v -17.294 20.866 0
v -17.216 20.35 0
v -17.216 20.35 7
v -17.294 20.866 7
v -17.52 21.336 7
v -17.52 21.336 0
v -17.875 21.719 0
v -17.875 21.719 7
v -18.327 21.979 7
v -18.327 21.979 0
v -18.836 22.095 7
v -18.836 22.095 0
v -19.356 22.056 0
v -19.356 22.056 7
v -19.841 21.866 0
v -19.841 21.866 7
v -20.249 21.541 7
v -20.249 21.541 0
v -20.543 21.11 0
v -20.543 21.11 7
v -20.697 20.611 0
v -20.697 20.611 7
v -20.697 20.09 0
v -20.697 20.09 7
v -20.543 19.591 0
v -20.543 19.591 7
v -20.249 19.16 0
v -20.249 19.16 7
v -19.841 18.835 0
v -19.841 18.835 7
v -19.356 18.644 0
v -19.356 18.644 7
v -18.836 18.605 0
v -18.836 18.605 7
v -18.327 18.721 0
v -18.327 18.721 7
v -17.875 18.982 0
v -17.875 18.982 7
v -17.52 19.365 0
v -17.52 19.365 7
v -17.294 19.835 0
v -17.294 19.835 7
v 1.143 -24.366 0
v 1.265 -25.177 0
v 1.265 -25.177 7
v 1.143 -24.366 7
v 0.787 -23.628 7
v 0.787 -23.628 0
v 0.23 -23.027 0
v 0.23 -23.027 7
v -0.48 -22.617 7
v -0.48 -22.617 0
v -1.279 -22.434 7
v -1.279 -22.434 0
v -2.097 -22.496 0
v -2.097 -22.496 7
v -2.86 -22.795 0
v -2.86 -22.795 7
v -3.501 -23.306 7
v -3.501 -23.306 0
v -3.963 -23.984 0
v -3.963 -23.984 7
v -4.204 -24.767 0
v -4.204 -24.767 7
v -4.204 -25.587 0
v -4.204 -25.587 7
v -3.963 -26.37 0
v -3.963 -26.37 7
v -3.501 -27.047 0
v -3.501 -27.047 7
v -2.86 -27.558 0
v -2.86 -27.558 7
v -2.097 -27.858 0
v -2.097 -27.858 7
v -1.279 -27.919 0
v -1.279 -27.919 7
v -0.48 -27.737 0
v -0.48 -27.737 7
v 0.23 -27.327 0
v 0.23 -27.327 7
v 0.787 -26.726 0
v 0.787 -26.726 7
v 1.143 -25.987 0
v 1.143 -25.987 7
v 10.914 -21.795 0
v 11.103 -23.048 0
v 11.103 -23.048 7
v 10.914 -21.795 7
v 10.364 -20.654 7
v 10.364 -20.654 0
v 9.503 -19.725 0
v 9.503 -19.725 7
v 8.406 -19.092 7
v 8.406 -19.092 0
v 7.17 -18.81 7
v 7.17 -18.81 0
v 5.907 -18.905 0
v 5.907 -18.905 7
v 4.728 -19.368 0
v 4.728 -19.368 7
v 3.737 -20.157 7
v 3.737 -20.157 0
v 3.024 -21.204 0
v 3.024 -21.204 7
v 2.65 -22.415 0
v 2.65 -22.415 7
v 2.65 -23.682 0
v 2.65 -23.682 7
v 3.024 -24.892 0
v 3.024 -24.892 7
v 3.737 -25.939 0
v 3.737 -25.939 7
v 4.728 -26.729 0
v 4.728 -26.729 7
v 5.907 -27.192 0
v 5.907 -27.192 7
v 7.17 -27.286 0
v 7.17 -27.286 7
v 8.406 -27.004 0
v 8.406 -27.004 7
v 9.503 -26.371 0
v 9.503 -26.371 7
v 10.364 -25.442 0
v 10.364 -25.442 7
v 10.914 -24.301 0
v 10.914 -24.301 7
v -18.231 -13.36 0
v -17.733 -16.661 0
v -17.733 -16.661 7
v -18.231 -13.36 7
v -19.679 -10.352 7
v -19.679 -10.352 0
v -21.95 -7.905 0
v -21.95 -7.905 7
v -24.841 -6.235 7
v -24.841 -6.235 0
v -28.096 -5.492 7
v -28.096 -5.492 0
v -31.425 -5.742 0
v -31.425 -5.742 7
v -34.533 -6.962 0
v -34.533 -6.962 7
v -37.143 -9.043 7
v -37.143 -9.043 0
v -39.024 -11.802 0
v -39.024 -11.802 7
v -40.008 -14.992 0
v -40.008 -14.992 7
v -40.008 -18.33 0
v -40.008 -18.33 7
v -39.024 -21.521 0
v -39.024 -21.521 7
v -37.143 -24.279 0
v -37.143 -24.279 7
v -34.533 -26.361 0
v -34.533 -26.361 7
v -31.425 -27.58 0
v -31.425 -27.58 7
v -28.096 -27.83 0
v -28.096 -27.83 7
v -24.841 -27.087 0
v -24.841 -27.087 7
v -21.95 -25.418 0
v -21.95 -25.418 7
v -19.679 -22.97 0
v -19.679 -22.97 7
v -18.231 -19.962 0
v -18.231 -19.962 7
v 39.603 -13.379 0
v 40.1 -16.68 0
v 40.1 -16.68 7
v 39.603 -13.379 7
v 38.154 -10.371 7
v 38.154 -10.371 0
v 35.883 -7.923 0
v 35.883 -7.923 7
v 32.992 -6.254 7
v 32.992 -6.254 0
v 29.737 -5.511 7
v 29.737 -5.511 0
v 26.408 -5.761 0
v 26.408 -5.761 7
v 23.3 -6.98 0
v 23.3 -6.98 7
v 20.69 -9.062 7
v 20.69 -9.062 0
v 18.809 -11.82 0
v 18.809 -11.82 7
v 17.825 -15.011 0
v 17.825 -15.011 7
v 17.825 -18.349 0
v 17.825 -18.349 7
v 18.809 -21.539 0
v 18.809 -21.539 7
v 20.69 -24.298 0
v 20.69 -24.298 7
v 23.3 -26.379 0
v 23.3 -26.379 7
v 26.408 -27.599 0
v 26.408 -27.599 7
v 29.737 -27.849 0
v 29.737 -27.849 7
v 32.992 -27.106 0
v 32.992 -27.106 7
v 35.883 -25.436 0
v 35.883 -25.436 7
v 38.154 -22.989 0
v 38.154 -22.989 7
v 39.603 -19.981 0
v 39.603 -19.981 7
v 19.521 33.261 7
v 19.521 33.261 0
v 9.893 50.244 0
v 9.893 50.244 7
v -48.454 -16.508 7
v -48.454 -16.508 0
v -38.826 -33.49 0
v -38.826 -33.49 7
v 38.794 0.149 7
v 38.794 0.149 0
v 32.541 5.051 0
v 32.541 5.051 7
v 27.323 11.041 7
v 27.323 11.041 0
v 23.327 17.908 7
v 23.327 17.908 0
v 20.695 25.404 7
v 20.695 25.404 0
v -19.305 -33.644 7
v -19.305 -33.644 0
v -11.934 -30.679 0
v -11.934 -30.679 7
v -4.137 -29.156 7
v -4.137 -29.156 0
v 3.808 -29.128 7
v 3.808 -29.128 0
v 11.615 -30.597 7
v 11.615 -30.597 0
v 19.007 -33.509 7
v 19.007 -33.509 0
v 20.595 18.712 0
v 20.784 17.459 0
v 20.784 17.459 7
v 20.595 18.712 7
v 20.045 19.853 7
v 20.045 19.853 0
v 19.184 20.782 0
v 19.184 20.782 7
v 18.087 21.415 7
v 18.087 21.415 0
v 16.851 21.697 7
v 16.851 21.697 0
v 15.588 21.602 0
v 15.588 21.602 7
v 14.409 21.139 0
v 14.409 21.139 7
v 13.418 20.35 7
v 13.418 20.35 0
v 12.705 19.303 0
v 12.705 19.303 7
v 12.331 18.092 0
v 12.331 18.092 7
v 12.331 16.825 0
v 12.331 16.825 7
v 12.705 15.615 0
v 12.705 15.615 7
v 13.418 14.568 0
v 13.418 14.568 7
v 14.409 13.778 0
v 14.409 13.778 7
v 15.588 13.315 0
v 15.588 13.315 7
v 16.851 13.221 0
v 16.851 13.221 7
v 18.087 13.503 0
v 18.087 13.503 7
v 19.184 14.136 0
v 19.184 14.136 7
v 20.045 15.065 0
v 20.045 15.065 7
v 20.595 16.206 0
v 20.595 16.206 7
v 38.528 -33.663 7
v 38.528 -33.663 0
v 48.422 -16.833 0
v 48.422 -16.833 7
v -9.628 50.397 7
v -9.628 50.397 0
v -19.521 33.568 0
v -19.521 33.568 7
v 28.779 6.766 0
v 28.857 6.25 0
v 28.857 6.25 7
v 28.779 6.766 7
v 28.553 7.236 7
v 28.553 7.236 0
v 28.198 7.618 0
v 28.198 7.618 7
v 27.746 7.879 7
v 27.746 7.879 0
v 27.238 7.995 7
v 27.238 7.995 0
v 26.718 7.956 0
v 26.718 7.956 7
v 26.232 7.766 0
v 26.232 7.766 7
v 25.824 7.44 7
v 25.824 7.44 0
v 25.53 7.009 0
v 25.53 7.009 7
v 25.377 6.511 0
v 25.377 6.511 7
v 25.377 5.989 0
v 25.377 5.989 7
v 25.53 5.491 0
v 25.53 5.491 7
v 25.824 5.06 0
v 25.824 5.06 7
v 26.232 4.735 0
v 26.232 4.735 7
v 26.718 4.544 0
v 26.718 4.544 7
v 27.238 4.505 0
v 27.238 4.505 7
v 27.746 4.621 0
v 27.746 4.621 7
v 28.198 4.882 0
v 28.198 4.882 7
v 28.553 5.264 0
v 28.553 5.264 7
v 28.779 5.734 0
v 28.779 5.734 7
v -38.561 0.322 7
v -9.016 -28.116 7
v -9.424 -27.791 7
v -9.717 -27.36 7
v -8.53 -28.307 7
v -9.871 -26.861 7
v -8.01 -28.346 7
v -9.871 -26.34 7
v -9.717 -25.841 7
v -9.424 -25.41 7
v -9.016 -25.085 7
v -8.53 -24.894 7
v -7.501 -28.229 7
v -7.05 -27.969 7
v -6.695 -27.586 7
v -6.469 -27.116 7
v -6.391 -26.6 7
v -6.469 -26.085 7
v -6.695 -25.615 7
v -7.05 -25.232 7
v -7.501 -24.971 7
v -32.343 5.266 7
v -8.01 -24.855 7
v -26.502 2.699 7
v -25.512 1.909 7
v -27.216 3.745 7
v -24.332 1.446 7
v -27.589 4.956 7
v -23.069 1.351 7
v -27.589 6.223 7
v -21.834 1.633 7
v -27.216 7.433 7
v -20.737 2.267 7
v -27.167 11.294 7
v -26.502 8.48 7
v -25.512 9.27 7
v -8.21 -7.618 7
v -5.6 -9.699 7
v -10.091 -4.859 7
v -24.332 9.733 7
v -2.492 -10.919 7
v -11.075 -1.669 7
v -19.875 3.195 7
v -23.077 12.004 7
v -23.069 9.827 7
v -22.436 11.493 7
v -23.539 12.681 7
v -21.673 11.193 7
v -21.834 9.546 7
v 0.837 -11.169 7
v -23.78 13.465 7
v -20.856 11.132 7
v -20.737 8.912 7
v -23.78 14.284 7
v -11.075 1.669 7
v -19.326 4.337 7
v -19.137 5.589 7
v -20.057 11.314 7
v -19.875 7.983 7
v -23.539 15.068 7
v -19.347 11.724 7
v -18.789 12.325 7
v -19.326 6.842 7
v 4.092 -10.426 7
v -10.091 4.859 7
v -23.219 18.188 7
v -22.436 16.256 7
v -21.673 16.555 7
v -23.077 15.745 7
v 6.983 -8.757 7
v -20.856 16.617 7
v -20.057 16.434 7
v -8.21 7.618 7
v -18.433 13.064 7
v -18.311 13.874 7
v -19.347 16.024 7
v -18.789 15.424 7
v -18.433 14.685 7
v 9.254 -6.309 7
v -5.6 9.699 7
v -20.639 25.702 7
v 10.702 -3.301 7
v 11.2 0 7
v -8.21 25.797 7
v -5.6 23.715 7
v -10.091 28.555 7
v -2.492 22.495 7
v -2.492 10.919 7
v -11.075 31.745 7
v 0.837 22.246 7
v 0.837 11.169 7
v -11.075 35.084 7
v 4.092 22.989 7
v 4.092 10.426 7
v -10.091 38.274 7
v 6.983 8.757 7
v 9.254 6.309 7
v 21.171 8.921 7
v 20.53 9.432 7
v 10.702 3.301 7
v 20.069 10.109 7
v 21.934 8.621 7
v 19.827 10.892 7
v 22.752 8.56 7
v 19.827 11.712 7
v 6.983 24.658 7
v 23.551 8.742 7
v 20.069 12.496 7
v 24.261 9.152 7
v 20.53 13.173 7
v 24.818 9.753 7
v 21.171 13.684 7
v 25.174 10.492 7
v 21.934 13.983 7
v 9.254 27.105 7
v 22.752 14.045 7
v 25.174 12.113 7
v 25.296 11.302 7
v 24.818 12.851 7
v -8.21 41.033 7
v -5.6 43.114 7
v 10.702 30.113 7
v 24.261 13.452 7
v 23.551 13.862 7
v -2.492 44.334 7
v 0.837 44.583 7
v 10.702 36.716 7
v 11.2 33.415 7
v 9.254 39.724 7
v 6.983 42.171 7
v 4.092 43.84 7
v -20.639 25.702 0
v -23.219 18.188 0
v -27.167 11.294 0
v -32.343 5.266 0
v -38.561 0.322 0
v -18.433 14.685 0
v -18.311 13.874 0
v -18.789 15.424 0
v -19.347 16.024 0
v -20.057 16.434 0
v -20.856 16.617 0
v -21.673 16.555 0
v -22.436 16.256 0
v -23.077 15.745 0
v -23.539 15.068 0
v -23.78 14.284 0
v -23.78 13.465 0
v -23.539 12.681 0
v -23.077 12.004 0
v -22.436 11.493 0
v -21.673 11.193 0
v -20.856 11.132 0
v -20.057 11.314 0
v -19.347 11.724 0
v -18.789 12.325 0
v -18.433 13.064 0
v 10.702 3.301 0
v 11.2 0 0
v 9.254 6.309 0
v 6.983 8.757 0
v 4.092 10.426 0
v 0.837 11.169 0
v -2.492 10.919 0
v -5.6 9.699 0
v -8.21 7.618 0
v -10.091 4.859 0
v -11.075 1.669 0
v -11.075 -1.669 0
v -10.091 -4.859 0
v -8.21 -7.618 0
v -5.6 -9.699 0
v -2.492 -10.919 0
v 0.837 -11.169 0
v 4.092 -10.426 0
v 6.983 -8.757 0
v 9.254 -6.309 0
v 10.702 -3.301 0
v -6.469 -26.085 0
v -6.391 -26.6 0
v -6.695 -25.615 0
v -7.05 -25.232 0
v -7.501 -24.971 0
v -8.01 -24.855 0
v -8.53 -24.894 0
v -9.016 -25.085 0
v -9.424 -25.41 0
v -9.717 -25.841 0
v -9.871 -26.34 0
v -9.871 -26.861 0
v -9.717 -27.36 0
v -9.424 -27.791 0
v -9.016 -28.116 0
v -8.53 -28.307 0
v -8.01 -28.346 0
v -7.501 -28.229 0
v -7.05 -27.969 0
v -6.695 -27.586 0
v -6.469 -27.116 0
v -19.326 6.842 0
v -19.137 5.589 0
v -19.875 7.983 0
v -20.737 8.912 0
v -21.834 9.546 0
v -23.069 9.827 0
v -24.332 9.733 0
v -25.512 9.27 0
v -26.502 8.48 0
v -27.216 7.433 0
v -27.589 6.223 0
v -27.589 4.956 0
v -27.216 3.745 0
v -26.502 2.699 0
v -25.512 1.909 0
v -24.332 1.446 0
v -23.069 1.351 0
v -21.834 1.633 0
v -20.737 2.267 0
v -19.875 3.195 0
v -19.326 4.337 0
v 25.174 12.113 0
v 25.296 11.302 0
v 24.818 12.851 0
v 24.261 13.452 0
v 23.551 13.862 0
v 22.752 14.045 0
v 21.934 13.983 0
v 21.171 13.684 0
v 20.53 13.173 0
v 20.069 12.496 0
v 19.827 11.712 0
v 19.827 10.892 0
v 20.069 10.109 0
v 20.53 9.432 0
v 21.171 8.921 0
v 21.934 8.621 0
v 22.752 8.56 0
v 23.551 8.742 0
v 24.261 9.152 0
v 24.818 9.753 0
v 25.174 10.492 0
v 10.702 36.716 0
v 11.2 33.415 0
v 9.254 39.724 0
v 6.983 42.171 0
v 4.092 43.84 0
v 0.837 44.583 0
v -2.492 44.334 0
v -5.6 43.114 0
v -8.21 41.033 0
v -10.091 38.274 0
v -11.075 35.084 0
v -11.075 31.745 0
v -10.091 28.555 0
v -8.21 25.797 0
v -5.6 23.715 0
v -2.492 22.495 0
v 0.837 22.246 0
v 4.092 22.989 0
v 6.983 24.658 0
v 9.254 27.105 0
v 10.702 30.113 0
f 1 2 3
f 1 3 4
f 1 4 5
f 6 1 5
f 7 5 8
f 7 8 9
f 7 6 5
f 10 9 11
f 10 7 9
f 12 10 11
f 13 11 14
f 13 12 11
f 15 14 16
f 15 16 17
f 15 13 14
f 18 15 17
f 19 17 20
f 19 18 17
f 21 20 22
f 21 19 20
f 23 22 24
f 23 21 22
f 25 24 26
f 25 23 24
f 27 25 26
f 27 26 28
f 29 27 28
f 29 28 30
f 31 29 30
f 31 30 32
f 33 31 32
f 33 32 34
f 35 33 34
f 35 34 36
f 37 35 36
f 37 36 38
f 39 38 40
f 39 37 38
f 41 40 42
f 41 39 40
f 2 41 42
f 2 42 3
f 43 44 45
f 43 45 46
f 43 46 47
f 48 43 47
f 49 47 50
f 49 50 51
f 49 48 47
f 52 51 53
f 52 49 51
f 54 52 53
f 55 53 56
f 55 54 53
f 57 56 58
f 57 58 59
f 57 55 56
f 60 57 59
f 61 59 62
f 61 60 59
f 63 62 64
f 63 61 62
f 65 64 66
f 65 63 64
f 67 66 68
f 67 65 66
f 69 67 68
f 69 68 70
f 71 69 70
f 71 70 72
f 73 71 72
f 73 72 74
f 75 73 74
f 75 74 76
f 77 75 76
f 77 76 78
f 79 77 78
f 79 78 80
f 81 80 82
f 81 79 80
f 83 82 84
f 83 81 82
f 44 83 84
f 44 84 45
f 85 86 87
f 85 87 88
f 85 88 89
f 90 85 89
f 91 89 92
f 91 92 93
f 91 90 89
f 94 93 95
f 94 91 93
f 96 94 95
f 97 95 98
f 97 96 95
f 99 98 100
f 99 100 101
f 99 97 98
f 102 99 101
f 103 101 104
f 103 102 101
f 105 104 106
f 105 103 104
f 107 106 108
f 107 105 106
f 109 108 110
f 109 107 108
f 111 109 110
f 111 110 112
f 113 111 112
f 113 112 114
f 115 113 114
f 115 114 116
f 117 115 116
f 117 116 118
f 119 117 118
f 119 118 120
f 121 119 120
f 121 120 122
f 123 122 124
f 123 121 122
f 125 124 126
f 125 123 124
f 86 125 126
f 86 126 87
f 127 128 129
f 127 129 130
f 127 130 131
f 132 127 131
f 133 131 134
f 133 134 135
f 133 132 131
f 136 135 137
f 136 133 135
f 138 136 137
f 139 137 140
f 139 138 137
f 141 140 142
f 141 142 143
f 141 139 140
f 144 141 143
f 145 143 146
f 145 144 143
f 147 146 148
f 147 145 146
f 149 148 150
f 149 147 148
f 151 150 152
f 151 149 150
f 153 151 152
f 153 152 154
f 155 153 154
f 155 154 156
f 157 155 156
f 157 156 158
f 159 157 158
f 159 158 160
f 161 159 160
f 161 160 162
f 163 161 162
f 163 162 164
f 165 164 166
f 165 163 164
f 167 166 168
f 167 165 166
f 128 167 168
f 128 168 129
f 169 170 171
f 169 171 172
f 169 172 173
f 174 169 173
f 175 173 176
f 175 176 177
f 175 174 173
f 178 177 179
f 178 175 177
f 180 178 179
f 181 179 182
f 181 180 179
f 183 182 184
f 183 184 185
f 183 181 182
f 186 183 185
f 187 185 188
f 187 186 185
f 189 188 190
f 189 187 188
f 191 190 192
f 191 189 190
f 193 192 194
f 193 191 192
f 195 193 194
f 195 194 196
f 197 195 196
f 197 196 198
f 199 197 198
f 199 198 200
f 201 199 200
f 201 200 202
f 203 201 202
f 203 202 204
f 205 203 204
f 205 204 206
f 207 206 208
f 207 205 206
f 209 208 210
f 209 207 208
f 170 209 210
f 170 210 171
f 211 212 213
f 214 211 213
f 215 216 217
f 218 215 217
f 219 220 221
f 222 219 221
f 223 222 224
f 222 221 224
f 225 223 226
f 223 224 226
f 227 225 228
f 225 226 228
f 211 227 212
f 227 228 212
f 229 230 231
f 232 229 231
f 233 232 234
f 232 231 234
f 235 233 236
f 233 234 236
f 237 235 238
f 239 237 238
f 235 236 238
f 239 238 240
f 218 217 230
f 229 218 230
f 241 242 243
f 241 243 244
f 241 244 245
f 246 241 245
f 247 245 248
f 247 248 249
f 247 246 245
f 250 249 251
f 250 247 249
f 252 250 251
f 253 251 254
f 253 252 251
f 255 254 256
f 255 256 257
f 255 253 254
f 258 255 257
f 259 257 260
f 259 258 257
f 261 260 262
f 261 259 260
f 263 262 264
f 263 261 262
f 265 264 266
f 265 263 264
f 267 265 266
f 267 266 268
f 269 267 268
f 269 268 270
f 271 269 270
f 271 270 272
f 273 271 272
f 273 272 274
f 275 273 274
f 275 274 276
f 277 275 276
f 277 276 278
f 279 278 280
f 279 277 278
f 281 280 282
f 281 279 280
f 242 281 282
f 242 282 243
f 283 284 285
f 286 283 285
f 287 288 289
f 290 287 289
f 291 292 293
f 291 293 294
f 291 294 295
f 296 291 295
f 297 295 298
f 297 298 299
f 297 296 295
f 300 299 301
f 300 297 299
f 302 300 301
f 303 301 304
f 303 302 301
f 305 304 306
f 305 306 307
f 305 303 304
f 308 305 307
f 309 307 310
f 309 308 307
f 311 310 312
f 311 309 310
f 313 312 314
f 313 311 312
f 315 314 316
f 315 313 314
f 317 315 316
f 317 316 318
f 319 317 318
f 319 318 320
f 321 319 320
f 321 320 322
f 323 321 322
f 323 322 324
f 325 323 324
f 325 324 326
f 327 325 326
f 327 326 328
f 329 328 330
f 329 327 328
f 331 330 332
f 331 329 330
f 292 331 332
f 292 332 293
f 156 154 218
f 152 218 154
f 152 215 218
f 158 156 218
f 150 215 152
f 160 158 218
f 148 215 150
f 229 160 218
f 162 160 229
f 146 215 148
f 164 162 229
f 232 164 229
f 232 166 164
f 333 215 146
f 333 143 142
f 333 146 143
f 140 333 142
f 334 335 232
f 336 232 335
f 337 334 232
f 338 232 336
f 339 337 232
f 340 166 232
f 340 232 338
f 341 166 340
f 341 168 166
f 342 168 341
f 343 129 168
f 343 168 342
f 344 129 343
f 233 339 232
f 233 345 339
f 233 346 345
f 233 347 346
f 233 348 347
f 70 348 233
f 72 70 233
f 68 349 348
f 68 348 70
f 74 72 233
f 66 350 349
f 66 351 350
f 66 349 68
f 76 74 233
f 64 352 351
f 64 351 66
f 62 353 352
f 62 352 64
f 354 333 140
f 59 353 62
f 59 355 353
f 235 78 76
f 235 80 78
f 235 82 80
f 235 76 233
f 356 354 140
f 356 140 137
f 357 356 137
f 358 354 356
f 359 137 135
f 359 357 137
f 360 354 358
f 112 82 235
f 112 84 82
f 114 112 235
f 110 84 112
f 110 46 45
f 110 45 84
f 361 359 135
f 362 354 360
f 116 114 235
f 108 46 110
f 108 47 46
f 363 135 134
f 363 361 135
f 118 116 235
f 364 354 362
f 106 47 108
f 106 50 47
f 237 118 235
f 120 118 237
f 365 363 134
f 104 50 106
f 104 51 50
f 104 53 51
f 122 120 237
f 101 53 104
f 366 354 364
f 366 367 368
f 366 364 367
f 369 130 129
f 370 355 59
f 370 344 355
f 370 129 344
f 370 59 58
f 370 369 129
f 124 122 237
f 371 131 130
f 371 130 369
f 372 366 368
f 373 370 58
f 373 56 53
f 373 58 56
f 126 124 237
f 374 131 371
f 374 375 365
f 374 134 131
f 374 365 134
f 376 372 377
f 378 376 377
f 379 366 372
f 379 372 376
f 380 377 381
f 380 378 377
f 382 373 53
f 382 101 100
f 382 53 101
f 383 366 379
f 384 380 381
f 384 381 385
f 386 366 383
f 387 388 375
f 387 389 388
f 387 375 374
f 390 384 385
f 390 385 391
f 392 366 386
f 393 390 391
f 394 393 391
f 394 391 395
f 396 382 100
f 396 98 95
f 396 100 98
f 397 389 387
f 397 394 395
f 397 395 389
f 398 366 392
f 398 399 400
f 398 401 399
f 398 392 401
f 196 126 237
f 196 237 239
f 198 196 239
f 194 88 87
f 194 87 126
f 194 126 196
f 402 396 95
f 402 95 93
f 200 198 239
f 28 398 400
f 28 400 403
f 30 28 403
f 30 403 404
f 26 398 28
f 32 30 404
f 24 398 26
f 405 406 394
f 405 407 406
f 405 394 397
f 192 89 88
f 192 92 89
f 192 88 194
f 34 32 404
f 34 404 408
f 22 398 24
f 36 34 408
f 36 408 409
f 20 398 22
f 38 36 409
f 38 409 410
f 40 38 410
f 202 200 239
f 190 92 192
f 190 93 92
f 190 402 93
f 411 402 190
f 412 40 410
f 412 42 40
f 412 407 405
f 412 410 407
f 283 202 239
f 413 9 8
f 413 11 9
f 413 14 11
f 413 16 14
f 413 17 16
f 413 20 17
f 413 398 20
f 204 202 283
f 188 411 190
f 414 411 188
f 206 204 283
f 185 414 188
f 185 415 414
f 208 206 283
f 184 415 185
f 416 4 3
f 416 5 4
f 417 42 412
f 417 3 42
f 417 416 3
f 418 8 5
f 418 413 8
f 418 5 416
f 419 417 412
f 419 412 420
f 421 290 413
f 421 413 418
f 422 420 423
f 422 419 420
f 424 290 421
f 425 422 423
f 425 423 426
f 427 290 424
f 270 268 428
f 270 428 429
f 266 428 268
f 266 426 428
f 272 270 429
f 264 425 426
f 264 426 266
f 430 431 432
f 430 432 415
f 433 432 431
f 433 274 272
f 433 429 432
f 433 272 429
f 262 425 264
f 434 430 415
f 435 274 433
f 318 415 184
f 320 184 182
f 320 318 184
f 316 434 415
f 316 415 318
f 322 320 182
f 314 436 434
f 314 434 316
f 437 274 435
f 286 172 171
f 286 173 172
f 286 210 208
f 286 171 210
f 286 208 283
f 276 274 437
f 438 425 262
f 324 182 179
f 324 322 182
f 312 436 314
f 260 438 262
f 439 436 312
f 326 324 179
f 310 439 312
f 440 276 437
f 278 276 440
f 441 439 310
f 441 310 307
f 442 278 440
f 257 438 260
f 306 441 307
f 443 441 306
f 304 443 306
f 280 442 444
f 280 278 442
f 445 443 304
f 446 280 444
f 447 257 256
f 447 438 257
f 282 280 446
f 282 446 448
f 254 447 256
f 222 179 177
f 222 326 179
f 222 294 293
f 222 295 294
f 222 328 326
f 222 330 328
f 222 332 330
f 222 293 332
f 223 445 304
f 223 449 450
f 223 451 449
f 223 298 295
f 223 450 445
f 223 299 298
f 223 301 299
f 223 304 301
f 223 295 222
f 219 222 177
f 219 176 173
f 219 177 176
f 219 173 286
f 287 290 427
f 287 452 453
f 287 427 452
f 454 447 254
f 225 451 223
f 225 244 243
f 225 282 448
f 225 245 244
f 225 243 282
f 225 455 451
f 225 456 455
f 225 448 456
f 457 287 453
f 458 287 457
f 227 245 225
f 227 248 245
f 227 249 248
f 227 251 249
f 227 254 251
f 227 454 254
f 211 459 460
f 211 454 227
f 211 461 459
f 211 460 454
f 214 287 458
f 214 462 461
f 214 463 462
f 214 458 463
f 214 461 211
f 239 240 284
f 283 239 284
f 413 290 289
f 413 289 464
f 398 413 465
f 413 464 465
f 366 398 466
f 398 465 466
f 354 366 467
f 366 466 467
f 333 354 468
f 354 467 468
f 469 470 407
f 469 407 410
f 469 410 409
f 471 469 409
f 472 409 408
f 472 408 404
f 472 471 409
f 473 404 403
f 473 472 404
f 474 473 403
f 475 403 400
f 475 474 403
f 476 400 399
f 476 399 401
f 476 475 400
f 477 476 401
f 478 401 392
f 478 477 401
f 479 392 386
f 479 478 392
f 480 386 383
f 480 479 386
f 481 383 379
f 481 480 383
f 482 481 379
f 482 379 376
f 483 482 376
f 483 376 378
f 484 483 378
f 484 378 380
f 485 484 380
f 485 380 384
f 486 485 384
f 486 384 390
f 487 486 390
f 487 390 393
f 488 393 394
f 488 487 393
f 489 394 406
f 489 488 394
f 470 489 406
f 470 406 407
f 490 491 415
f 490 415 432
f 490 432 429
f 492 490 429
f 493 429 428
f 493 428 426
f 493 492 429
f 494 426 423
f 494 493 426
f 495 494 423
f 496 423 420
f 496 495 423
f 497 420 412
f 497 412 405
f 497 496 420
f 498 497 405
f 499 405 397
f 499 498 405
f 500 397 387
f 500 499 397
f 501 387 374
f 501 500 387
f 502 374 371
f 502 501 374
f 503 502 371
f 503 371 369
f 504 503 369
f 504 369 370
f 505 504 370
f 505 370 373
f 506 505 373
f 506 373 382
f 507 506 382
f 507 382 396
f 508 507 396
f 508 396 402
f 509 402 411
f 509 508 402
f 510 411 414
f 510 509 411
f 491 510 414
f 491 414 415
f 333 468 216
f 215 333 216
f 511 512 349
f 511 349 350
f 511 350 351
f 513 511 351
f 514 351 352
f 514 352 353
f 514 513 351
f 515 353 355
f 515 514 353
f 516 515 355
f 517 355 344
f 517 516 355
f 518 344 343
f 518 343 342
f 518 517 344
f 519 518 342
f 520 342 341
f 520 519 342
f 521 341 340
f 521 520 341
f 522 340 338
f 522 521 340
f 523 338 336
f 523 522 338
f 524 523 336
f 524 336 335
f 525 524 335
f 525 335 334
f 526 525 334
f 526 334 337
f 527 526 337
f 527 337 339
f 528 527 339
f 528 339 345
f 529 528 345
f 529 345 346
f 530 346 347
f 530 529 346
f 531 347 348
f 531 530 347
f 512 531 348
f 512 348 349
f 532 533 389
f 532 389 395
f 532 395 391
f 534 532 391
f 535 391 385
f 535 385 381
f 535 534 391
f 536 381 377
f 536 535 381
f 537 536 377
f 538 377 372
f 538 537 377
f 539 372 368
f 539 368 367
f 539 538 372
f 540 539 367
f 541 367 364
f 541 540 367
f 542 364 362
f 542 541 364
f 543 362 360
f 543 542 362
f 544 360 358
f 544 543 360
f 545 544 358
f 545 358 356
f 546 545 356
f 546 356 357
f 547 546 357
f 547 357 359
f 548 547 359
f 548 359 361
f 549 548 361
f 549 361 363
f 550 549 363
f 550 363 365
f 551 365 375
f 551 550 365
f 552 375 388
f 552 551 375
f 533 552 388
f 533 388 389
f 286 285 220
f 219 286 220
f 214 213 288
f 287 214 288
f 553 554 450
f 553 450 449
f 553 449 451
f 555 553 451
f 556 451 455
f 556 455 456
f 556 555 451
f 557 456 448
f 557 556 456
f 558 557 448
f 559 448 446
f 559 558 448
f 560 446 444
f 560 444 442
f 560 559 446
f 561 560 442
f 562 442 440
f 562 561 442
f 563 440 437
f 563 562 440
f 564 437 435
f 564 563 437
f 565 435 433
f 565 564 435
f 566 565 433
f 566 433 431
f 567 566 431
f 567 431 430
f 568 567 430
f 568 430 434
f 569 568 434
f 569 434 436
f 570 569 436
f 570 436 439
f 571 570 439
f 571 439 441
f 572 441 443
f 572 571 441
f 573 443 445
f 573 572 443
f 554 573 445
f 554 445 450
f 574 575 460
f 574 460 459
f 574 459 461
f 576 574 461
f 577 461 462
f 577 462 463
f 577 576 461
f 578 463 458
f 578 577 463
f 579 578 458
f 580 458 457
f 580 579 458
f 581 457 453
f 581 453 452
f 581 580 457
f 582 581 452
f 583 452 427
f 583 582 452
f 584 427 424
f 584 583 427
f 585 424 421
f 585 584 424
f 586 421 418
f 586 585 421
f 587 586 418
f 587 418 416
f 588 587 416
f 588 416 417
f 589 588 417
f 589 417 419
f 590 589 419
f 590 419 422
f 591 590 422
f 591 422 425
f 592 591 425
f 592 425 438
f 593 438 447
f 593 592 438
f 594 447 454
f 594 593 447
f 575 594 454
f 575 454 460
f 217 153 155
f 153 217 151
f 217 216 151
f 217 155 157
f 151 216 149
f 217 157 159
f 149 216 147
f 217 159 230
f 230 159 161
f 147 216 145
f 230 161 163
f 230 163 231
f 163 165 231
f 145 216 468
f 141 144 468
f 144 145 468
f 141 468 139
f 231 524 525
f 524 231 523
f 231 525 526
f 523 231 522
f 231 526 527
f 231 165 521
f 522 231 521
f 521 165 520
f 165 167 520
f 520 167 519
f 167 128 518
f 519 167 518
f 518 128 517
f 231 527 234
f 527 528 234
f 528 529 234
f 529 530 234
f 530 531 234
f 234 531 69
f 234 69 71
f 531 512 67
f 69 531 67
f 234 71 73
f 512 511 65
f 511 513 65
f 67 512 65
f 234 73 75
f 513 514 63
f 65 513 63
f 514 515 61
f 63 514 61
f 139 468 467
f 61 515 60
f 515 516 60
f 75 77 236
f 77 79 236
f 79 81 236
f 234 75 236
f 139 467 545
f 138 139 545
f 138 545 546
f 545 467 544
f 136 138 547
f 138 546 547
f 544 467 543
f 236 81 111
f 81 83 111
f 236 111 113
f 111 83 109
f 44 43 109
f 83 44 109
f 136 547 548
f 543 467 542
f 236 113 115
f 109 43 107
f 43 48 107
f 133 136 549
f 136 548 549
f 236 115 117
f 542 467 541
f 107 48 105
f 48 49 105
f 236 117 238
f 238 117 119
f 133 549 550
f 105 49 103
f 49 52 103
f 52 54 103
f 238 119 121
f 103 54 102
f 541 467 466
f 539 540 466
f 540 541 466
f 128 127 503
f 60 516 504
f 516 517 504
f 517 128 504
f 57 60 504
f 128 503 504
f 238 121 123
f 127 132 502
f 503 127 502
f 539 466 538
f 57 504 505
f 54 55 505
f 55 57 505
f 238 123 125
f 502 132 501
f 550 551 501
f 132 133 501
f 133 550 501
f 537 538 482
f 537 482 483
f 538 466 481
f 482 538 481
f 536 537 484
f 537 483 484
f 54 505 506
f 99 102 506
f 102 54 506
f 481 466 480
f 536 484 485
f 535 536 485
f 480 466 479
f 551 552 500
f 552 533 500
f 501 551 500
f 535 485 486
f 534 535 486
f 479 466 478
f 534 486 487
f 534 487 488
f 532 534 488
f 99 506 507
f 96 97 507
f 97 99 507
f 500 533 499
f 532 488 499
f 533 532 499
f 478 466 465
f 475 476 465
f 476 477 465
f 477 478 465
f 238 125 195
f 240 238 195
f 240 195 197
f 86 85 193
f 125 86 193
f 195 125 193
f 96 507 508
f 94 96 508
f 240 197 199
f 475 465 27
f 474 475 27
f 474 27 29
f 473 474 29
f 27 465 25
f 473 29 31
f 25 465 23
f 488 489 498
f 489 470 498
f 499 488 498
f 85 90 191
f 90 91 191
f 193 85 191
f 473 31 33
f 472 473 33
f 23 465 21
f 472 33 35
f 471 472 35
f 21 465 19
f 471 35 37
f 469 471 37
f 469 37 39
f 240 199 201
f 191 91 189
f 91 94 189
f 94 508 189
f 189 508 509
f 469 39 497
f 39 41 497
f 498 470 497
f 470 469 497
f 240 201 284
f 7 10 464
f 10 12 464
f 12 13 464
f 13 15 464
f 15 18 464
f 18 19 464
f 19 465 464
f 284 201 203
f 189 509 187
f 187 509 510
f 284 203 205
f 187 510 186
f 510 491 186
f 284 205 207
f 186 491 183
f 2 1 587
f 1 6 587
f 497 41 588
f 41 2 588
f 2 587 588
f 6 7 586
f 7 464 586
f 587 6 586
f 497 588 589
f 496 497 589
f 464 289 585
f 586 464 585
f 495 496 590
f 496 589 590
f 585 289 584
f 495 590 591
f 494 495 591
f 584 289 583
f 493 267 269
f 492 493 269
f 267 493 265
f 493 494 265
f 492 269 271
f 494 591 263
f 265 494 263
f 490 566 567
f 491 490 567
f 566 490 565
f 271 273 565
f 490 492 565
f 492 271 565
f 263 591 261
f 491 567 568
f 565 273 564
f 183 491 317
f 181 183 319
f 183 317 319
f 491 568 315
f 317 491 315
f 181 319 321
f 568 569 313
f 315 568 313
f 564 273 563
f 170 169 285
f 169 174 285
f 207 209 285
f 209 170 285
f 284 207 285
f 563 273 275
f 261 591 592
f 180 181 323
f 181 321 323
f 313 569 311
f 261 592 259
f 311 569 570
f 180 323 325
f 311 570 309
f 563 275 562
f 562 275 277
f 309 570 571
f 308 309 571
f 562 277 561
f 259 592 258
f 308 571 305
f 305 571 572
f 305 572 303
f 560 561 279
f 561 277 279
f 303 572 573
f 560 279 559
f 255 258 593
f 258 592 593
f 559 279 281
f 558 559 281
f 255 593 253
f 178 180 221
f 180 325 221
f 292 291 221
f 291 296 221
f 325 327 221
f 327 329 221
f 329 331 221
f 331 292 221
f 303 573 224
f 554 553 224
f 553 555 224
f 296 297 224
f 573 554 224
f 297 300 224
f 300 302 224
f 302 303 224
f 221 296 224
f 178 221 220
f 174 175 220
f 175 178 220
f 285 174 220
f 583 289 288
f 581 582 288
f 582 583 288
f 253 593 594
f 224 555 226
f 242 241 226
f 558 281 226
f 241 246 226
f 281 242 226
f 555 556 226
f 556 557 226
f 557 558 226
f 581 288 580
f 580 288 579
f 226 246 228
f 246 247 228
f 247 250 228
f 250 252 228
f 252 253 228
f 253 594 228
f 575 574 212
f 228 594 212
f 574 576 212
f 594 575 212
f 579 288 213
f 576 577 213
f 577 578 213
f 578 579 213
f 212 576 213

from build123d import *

# Parameters (mm, degrees)
F0_R     = 11.2
F0_R_2   = 1.75
F0_R_3   = 2.75
F0_R_4   = 4.25
F1_DEPTH = 7


with BuildPart() as f1:
    # F0 (on Top) → F1 (new body)
    with BuildSketch(Plane.XY):
        Polygon((19.521375, 33.261315), (9.893419, 50.243954), (-9.627956, 50.39722), (-19.521375, 33.567845), (-9.893419, 16.585206), (9.627956, 16.43194), align=None)
        with Locations((0, 33.41458)):
            Circle(F0_R, mode=Mode.SUBTRACT)
        with BuildLine():
            ThreePointArc((38.793711, 0.149422), (25.162096, 14.379871), (19.521375, 33.261315))
            Line((19.521375, 33.261315), (9.627956, 16.43194))
            ThreePointArc((9.627956, 16.43194), (9.917718, 5.657179), (19.272335, 0.302687))
            Line((19.272335, 0.302687), (38.793711, 0.149422))
        make_face()
        with Locations((27.107068, 6.250099)):
            Circle(F0_R_2, mode=Mode.SUBTRACT)
        with Locations((22.546168, 11.302348)):
            Circle(F0_R_3, mode=Mode.SUBTRACT)
        with Locations((16.533859, 17.45883)):
            Circle(F0_R_4, mode=Mode.SUBTRACT)
        Polygon((48.421667, -16.833218), (38.793711, 0.149422), (19.272335, 0.302687), (9.378916, -16.526687), (19.006872, -33.509327), (38.528247, -33.662592), align=None)
        with Locations((28.900291, -16.679952)):
            Circle(F0_R, mode=Mode.SUBTRACT)
        with BuildLine():
            Line((-9.893419, 16.585206), (-19.521375, 33.567845))
            ThreePointArc((-19.521375, 33.567845), (-25.029499, 14.647296), (-38.560948, 0.321567))
            Line((-38.560948, 0.321567), (-19.039573, 0.168302))
            ThreePointArc((-19.039573, 0.168302), (-9.853236, 5.806623), (-9.893419, 16.585206))
        make_face()
        with Locations((-23.38672, 5.589327)):
            Circle(F0_R_4, mode=Mode.SUBTRACT)
        with Locations((-21.061205, 13.87438)):
            Circle(F0_R_3, mode=Mode.SUBTRACT)
        with Locations((-18.966278, 20.35036)):
            Circle(F0_R_2, mode=Mode.SUBTRACT)
        Polygon((-19.039573, 0.168302), (-38.560948, 0.321567), (-48.454367, -16.507807), (-38.826411, -33.490447), (-19.305036, -33.643712), (-9.411617, -16.814338), align=None)
        with Locations((-28.932992, -16.661073)):
            Circle(F0_R, mode=Mode.SUBTRACT)
        with BuildLine():
            Line((19.006872, -33.509327), (9.378916, -16.526687))
            ThreePointArc((9.378916, -16.526687), (-0.097182, -11.390247), (-9.411617, -16.814338))
            Line((-9.411617, -16.814338), (-19.305036, -33.643712))
            ThreePointArc((-19.305036, -33.643712), (-0.165298, -28.953612), (19.006872, -33.509327))
        make_face()
        with Locations((-8.14079, -26.600459)):
            Circle(F0_R_2, mode=Mode.SUBTRACT)
        with Locations((-1.484963, -25.176729)):
            Circle(F0_R_3, mode=Mode.SUBTRACT)
        with Locations((6.852861, -23.048157)):
            Circle(F0_R_4, mode=Mode.SUBTRACT)
        with BuildLine():
            ThreePointArc((19.272335, 0.302687), (9.917718, 5.657179), (9.627956, 16.43194))
            Line((9.627956, 16.43194), (-9.893419, 16.585206))
            ThreePointArc((-9.893419, 16.585206), (-9.853236, 5.806623), (-19.039573, 0.168302))
            Line((-19.039573, 0.168302), (-9.411617, -16.814338))
            ThreePointArc((-9.411617, -16.814338), (-0.097182, -11.390247), (9.378916, -16.526687))
            Line((9.378916, -16.526687), (19.272335, 0.302687))
        make_face()
        Circle(F0_R, mode=Mode.SUBTRACT)
    extrude(amount=F1_DEPTH)


solid = f1.part
